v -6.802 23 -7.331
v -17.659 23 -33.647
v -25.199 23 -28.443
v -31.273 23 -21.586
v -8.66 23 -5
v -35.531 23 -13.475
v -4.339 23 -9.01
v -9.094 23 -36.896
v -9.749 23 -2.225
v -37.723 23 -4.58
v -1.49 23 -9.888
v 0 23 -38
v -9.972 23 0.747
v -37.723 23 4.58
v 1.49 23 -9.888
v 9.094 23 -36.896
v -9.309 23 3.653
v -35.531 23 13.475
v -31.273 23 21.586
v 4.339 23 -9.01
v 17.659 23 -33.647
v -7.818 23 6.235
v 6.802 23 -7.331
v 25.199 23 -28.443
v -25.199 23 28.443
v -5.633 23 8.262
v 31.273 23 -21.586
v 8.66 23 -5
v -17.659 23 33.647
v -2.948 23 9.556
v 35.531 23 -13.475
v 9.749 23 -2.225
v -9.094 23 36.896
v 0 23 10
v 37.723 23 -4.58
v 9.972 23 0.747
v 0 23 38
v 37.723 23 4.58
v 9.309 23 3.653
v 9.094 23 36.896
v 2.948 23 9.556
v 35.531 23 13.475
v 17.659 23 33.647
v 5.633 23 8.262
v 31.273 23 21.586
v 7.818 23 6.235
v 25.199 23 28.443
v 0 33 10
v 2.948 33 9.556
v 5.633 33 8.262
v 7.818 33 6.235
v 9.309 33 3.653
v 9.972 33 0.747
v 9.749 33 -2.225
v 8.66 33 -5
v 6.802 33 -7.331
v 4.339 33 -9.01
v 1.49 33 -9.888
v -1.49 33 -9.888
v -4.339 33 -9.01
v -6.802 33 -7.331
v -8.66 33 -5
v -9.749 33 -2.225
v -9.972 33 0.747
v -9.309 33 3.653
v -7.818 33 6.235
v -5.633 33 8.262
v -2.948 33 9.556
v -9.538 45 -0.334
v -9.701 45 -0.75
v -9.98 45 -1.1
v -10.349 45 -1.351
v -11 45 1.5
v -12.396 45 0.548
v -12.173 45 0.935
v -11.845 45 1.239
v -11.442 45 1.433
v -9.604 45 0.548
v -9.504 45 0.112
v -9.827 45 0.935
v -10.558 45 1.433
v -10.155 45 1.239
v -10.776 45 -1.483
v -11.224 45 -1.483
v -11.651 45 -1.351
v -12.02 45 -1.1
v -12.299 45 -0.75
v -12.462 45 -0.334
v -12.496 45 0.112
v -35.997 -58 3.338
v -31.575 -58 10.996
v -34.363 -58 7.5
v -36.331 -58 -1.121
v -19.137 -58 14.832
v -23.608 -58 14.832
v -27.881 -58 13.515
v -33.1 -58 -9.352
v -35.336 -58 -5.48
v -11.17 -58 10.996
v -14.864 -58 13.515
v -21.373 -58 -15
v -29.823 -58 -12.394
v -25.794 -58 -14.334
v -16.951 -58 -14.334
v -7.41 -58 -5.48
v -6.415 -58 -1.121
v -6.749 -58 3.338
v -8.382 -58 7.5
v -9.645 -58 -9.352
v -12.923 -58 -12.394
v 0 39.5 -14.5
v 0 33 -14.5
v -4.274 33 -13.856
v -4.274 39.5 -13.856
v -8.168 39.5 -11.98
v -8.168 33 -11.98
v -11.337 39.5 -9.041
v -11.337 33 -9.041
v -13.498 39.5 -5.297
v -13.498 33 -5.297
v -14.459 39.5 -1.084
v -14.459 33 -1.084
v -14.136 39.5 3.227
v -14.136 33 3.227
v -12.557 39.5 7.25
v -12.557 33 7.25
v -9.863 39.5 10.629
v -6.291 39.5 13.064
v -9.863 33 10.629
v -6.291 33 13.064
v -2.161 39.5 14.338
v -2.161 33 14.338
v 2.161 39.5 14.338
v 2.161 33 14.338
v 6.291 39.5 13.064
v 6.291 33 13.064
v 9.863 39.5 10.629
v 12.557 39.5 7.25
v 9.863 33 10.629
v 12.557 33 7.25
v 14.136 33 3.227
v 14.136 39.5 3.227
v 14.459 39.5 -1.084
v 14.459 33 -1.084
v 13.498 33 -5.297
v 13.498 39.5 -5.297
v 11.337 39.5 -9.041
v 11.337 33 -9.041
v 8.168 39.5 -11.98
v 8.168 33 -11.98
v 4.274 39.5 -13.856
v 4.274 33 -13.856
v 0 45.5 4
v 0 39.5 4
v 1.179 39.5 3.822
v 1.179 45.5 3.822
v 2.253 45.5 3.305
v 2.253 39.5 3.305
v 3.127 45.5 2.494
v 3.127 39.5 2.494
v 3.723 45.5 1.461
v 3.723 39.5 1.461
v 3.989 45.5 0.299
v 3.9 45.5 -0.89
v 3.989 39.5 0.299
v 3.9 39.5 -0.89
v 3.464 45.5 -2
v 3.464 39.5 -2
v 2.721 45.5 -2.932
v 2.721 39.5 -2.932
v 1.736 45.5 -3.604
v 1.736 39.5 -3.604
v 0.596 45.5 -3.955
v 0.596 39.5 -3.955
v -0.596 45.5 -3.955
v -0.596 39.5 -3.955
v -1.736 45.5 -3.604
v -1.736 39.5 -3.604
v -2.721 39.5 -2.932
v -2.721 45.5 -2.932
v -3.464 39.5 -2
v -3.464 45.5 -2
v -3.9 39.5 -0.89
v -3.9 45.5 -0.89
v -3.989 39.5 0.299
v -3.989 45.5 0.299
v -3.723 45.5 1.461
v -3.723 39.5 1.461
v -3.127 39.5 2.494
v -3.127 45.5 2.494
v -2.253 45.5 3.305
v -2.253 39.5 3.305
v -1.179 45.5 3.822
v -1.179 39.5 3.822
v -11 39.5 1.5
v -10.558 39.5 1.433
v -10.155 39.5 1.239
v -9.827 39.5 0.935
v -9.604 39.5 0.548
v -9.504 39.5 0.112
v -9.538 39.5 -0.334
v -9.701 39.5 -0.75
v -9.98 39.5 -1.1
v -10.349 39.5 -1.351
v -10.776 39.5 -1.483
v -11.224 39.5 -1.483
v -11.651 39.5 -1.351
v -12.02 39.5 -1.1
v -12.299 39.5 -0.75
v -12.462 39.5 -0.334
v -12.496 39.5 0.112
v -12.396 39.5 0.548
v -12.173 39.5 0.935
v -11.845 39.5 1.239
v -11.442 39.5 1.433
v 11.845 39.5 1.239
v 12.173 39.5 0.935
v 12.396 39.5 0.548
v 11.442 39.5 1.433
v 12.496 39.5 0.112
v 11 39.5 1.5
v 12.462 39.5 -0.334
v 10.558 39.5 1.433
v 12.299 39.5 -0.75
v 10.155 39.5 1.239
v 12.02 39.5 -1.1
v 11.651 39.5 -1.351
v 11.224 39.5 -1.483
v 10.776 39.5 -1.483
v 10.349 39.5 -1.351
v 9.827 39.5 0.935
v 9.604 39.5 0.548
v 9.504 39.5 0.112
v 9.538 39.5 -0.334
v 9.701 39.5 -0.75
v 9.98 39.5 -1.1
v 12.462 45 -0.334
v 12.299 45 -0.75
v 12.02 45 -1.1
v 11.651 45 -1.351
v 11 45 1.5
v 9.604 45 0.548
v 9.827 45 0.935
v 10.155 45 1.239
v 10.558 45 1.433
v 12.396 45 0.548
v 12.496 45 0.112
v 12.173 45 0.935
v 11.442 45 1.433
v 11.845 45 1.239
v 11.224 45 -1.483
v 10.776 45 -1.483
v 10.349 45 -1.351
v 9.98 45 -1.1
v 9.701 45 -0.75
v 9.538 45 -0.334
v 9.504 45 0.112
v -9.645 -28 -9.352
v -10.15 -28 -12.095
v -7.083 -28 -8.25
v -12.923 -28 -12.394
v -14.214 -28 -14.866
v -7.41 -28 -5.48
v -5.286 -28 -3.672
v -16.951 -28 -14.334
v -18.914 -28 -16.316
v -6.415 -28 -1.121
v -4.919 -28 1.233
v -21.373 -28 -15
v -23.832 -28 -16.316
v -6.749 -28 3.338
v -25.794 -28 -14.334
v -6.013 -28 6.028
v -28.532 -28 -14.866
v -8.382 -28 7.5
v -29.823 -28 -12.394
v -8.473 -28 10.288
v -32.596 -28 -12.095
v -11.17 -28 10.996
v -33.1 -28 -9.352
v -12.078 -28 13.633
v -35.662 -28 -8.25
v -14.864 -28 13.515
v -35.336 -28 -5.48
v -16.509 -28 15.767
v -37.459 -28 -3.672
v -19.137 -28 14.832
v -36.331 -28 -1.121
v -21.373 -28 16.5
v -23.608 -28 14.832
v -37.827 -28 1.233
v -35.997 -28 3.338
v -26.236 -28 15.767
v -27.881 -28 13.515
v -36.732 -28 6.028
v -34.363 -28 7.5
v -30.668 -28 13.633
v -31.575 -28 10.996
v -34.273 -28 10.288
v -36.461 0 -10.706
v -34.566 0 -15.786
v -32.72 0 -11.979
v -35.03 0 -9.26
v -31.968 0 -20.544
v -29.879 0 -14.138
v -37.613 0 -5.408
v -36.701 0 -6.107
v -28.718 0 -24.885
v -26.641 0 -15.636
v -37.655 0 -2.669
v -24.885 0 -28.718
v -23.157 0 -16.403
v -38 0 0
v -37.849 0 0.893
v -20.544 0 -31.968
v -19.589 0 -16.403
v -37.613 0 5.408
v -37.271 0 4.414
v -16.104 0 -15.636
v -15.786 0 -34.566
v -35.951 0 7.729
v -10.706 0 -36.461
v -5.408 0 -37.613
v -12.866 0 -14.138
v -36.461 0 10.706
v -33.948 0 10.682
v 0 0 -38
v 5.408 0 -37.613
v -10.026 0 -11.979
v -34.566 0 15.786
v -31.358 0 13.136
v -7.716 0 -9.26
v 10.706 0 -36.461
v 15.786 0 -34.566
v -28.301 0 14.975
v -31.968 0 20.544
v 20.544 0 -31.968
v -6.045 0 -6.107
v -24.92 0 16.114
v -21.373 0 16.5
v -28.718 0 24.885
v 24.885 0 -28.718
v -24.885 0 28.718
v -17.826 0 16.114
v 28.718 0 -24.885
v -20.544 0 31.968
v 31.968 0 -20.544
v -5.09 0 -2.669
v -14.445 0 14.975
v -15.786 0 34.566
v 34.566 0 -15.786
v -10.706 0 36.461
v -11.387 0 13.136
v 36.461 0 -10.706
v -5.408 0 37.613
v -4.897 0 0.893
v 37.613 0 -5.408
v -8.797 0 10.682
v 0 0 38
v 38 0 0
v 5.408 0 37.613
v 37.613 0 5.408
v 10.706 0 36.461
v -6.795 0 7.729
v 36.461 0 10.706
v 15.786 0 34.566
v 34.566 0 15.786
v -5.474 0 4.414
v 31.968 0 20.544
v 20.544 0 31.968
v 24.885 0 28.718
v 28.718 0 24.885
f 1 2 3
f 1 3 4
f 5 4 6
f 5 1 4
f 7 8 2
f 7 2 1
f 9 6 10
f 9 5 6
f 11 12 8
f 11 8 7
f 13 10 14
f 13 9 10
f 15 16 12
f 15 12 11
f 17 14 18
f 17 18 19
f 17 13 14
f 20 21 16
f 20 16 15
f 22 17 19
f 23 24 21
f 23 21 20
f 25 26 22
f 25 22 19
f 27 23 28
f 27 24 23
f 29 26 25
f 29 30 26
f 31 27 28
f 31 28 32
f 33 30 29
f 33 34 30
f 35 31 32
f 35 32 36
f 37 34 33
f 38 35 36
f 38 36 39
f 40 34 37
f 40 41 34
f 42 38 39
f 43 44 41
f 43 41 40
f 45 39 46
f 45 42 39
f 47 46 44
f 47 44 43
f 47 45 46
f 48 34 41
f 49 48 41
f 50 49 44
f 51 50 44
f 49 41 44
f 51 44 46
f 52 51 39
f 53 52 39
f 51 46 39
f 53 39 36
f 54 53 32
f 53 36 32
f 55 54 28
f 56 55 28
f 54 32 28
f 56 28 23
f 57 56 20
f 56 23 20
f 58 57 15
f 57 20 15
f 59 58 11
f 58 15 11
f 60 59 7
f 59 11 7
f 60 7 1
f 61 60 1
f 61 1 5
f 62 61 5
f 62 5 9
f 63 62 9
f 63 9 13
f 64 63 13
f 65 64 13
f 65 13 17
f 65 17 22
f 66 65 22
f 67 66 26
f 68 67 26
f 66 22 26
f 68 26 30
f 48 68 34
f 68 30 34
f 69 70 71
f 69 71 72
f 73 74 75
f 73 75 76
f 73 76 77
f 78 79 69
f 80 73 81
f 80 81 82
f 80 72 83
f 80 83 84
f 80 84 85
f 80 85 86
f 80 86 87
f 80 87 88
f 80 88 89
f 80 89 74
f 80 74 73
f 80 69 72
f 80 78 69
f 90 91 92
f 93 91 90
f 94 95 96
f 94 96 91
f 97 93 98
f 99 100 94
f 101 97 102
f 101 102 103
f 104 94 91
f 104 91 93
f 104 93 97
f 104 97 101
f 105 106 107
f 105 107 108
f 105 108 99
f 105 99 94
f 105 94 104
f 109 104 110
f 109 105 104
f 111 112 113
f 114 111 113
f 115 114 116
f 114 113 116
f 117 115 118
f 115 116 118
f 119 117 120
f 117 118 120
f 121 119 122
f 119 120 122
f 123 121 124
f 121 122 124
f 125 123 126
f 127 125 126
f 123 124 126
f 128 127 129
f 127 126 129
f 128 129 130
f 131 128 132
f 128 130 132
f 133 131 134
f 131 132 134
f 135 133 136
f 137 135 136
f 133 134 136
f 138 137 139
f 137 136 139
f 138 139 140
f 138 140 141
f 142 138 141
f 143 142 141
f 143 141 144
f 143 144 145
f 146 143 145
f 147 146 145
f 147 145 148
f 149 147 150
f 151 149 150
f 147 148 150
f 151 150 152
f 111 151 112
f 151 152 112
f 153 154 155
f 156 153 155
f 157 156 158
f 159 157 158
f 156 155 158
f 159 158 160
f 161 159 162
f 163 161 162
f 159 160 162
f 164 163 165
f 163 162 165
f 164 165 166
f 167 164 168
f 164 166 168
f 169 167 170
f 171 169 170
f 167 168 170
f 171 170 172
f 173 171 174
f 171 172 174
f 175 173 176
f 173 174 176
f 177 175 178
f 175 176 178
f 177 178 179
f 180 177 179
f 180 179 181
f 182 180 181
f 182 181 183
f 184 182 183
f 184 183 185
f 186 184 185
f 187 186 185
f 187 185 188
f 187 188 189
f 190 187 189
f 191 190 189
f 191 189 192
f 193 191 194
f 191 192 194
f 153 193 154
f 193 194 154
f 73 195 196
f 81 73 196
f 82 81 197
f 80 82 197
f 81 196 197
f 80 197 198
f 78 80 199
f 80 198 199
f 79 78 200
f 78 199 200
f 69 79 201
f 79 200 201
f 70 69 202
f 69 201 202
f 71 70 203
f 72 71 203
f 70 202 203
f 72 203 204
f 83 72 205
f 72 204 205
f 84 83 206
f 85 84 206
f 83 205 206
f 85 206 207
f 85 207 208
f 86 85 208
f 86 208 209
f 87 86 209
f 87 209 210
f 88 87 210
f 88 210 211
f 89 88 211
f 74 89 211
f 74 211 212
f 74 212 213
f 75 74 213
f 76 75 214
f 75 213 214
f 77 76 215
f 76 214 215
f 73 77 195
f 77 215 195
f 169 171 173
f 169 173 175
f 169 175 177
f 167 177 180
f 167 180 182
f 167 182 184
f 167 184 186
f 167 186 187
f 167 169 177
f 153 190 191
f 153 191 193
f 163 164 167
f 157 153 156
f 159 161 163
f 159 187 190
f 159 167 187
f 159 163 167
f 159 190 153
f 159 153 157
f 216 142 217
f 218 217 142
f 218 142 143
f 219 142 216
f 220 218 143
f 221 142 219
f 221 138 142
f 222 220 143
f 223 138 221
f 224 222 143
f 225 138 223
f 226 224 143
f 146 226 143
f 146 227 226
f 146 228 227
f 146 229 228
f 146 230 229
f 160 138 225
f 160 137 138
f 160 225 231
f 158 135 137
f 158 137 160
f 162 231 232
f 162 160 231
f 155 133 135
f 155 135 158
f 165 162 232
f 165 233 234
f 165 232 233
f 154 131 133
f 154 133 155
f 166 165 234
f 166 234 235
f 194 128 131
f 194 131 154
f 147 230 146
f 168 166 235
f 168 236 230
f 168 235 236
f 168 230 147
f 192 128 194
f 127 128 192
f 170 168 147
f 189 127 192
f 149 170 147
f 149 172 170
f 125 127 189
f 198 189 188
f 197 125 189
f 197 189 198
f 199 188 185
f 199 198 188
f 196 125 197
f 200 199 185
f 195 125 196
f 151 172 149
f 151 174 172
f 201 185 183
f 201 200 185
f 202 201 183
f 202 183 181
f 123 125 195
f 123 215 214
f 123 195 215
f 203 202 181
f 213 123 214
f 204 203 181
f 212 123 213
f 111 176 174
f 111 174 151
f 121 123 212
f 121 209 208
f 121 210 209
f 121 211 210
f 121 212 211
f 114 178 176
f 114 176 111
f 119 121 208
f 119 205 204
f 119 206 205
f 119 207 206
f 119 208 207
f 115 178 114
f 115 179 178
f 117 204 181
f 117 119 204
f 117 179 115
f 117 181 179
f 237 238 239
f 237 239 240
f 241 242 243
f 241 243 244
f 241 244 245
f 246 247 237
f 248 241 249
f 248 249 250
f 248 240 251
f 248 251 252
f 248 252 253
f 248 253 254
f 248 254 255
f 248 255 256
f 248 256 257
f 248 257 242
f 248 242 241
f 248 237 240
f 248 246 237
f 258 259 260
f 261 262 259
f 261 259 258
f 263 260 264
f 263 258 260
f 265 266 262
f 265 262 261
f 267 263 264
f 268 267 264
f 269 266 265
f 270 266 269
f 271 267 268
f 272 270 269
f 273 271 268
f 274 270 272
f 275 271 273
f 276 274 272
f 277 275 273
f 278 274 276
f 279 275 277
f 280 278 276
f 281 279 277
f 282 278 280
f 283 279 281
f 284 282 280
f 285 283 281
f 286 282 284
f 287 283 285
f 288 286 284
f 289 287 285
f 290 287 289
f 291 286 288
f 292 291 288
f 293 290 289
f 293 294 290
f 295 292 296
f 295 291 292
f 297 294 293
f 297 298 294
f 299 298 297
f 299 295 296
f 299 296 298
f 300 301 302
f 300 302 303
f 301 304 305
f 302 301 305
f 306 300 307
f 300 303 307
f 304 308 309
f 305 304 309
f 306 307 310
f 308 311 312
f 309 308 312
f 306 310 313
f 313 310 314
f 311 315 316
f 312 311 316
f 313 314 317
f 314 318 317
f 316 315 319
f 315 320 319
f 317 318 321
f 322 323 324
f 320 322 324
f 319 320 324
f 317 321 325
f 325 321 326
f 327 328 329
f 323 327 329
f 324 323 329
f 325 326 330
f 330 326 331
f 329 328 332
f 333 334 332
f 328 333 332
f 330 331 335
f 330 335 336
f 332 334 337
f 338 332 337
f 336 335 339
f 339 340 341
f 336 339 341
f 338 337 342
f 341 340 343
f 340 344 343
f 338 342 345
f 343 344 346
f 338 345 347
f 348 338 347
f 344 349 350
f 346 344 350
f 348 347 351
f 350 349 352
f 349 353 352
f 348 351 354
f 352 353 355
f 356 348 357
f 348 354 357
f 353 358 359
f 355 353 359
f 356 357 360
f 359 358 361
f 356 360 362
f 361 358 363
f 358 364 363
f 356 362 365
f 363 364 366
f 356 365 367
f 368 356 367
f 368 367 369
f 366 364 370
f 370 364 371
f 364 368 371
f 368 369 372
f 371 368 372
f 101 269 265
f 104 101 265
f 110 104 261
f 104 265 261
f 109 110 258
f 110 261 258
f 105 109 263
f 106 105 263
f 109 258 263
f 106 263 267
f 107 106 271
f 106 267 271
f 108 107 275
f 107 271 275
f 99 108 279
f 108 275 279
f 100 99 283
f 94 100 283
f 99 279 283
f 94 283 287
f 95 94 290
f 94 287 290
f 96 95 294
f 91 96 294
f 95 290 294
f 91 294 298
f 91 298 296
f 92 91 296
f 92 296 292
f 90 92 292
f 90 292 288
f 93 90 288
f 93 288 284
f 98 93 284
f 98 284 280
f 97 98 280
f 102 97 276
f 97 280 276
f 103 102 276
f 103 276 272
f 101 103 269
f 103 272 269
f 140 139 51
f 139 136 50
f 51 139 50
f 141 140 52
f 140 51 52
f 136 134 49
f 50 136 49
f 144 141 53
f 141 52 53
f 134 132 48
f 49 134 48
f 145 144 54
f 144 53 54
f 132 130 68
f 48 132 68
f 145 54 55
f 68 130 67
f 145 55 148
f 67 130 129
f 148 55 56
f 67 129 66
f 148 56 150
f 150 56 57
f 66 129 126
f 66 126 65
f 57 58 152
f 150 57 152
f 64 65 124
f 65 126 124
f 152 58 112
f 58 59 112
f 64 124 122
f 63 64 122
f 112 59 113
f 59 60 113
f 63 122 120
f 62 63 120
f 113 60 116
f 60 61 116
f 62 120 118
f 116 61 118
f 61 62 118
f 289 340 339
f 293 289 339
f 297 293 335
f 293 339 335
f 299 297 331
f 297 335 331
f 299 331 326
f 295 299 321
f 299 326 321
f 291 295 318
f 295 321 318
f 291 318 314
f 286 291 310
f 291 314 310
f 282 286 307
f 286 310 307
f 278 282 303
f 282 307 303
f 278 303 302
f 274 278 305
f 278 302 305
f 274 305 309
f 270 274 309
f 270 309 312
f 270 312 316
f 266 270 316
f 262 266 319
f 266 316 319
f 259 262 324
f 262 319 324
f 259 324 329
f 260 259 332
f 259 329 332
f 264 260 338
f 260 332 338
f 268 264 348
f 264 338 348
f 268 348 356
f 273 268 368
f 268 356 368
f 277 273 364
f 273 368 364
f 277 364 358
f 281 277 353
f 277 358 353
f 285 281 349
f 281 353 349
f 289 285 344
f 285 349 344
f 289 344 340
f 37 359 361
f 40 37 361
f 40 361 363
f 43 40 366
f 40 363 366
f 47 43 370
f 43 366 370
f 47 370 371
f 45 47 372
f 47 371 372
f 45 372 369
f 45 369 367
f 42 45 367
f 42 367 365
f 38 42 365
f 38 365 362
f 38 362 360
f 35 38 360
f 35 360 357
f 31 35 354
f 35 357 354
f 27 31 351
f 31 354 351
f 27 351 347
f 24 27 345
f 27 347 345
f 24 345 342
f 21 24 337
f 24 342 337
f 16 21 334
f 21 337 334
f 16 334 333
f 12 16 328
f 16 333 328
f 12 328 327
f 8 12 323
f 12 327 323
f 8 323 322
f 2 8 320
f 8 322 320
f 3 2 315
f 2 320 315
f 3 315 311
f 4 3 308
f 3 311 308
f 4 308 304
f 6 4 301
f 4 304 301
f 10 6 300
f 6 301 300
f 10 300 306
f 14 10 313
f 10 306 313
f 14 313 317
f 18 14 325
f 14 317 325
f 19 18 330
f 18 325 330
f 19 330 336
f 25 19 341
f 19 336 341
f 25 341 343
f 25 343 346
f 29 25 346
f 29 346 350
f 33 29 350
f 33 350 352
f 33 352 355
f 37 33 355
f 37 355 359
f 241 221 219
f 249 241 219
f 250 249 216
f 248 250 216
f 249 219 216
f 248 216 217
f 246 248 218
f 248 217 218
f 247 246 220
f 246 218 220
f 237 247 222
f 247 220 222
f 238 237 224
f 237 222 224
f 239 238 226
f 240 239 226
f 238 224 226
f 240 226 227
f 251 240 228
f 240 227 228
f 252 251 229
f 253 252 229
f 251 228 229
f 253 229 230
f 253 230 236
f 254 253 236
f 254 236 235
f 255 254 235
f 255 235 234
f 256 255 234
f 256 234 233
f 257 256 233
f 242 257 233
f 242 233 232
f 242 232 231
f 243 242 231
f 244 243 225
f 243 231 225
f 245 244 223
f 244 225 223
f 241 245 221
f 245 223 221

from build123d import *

# Parameters (mm, degrees)
SKETCH_1_R      = 38
EXTRUDE_1_DEPTH = 23
SKETCH_2_R      = 10
EXTRUDE_2_DEPTH = 10
SKETCH_3_R      = 14.5
EXTRUDE_3_DEPTH = 6.5
SKETCH_4_R      = 4
EXTRUDE_4_DEPTH = 6
SKETCH_5_R      = 1.5
EXTRUDE_5_DEPTH = 5.5
SKETCH_6_R      = 16.5
EXTRUDE_6_DEPTH = 28
SKETCH_7_R      = 15
EXTRUDE_7_DEPTH = 30


with BuildPart() as part:
    # Эскиз1 → Вытянуть1 (new body)
    with BuildSketch(Plane(origin=(0, 0, 0), x_dir=(1, 0, 0), z_dir=(0, 1, 0))):
        with Locations(Location((0, 0, 0), (0, 0, 270))):
            Circle(SKETCH_1_R)
    extrude(amount=EXTRUDE_1_DEPTH)

    # Эскиз2 → Вытянуть2 (add)
    with BuildSketch(Plane(origin=(0, 23, 0), x_dir=(1, 0, 0), z_dir=(0, 1, 0))):
        with Locations(Location((0, 0, 0), (0, 0, 270))):
            Circle(SKETCH_2_R)
    extrude(amount=EXTRUDE_2_DEPTH)

    # Эскиз3 → Вытянуть3 (add)
    with BuildSketch(Plane(origin=(0, 33, 0), x_dir=(1, 0, 0), z_dir=(0, 1, 0))):
        with Locations(Location((0, 0, 0), (0, 0, 90))):
            Circle(SKETCH_3_R)
    extrude(amount=EXTRUDE_3_DEPTH)

    # Эскиз4 → Вытянуть4 (add)
    with BuildSketch(Plane(origin=(0, 39.5, 0), x_dir=(-1, 0, 0), z_dir=(0, 1, 0))):
        with Locations(Location((0, 0, 0), (0, 0, 90))):
            Circle(SKETCH_4_R)
    extrude(amount=EXTRUDE_4_DEPTH)

    # Эскиз5 → Вытянуть5 (add)
    with BuildSketch(Plane(origin=(0, 39.5, 0), x_dir=(-1, 0, 0), z_dir=(0, 1, 0))):
        with Locations(Location((11, 0, 0), (0, 0, 90))):
            Circle(SKETCH_5_R)
        with Locations(Location((-11, 0, 0), (0, 0, 90))):
            Circle(SKETCH_5_R)
    extrude(amount=EXTRUDE_5_DEPTH)

    # Эскиз6 → Вытянуть6 (add)
    with BuildSketch(Plane.XZ):
        with Locations(Location((-21.372740523, 0, 0), (0, 0, 90))):
            Circle(SKETCH_6_R)
    extrude(amount=EXTRUDE_6_DEPTH)

    # Эскиз7 → Вытянуть7 (add)
    with BuildSketch(Plane.XZ.offset(28)):
        with Locations(Location((-21.372740523, 0, 0), (0, 0, 270))):
            Circle(SKETCH_7_R)
    extrude(amount=EXTRUDE_7_DEPTH)


solid = part.part
